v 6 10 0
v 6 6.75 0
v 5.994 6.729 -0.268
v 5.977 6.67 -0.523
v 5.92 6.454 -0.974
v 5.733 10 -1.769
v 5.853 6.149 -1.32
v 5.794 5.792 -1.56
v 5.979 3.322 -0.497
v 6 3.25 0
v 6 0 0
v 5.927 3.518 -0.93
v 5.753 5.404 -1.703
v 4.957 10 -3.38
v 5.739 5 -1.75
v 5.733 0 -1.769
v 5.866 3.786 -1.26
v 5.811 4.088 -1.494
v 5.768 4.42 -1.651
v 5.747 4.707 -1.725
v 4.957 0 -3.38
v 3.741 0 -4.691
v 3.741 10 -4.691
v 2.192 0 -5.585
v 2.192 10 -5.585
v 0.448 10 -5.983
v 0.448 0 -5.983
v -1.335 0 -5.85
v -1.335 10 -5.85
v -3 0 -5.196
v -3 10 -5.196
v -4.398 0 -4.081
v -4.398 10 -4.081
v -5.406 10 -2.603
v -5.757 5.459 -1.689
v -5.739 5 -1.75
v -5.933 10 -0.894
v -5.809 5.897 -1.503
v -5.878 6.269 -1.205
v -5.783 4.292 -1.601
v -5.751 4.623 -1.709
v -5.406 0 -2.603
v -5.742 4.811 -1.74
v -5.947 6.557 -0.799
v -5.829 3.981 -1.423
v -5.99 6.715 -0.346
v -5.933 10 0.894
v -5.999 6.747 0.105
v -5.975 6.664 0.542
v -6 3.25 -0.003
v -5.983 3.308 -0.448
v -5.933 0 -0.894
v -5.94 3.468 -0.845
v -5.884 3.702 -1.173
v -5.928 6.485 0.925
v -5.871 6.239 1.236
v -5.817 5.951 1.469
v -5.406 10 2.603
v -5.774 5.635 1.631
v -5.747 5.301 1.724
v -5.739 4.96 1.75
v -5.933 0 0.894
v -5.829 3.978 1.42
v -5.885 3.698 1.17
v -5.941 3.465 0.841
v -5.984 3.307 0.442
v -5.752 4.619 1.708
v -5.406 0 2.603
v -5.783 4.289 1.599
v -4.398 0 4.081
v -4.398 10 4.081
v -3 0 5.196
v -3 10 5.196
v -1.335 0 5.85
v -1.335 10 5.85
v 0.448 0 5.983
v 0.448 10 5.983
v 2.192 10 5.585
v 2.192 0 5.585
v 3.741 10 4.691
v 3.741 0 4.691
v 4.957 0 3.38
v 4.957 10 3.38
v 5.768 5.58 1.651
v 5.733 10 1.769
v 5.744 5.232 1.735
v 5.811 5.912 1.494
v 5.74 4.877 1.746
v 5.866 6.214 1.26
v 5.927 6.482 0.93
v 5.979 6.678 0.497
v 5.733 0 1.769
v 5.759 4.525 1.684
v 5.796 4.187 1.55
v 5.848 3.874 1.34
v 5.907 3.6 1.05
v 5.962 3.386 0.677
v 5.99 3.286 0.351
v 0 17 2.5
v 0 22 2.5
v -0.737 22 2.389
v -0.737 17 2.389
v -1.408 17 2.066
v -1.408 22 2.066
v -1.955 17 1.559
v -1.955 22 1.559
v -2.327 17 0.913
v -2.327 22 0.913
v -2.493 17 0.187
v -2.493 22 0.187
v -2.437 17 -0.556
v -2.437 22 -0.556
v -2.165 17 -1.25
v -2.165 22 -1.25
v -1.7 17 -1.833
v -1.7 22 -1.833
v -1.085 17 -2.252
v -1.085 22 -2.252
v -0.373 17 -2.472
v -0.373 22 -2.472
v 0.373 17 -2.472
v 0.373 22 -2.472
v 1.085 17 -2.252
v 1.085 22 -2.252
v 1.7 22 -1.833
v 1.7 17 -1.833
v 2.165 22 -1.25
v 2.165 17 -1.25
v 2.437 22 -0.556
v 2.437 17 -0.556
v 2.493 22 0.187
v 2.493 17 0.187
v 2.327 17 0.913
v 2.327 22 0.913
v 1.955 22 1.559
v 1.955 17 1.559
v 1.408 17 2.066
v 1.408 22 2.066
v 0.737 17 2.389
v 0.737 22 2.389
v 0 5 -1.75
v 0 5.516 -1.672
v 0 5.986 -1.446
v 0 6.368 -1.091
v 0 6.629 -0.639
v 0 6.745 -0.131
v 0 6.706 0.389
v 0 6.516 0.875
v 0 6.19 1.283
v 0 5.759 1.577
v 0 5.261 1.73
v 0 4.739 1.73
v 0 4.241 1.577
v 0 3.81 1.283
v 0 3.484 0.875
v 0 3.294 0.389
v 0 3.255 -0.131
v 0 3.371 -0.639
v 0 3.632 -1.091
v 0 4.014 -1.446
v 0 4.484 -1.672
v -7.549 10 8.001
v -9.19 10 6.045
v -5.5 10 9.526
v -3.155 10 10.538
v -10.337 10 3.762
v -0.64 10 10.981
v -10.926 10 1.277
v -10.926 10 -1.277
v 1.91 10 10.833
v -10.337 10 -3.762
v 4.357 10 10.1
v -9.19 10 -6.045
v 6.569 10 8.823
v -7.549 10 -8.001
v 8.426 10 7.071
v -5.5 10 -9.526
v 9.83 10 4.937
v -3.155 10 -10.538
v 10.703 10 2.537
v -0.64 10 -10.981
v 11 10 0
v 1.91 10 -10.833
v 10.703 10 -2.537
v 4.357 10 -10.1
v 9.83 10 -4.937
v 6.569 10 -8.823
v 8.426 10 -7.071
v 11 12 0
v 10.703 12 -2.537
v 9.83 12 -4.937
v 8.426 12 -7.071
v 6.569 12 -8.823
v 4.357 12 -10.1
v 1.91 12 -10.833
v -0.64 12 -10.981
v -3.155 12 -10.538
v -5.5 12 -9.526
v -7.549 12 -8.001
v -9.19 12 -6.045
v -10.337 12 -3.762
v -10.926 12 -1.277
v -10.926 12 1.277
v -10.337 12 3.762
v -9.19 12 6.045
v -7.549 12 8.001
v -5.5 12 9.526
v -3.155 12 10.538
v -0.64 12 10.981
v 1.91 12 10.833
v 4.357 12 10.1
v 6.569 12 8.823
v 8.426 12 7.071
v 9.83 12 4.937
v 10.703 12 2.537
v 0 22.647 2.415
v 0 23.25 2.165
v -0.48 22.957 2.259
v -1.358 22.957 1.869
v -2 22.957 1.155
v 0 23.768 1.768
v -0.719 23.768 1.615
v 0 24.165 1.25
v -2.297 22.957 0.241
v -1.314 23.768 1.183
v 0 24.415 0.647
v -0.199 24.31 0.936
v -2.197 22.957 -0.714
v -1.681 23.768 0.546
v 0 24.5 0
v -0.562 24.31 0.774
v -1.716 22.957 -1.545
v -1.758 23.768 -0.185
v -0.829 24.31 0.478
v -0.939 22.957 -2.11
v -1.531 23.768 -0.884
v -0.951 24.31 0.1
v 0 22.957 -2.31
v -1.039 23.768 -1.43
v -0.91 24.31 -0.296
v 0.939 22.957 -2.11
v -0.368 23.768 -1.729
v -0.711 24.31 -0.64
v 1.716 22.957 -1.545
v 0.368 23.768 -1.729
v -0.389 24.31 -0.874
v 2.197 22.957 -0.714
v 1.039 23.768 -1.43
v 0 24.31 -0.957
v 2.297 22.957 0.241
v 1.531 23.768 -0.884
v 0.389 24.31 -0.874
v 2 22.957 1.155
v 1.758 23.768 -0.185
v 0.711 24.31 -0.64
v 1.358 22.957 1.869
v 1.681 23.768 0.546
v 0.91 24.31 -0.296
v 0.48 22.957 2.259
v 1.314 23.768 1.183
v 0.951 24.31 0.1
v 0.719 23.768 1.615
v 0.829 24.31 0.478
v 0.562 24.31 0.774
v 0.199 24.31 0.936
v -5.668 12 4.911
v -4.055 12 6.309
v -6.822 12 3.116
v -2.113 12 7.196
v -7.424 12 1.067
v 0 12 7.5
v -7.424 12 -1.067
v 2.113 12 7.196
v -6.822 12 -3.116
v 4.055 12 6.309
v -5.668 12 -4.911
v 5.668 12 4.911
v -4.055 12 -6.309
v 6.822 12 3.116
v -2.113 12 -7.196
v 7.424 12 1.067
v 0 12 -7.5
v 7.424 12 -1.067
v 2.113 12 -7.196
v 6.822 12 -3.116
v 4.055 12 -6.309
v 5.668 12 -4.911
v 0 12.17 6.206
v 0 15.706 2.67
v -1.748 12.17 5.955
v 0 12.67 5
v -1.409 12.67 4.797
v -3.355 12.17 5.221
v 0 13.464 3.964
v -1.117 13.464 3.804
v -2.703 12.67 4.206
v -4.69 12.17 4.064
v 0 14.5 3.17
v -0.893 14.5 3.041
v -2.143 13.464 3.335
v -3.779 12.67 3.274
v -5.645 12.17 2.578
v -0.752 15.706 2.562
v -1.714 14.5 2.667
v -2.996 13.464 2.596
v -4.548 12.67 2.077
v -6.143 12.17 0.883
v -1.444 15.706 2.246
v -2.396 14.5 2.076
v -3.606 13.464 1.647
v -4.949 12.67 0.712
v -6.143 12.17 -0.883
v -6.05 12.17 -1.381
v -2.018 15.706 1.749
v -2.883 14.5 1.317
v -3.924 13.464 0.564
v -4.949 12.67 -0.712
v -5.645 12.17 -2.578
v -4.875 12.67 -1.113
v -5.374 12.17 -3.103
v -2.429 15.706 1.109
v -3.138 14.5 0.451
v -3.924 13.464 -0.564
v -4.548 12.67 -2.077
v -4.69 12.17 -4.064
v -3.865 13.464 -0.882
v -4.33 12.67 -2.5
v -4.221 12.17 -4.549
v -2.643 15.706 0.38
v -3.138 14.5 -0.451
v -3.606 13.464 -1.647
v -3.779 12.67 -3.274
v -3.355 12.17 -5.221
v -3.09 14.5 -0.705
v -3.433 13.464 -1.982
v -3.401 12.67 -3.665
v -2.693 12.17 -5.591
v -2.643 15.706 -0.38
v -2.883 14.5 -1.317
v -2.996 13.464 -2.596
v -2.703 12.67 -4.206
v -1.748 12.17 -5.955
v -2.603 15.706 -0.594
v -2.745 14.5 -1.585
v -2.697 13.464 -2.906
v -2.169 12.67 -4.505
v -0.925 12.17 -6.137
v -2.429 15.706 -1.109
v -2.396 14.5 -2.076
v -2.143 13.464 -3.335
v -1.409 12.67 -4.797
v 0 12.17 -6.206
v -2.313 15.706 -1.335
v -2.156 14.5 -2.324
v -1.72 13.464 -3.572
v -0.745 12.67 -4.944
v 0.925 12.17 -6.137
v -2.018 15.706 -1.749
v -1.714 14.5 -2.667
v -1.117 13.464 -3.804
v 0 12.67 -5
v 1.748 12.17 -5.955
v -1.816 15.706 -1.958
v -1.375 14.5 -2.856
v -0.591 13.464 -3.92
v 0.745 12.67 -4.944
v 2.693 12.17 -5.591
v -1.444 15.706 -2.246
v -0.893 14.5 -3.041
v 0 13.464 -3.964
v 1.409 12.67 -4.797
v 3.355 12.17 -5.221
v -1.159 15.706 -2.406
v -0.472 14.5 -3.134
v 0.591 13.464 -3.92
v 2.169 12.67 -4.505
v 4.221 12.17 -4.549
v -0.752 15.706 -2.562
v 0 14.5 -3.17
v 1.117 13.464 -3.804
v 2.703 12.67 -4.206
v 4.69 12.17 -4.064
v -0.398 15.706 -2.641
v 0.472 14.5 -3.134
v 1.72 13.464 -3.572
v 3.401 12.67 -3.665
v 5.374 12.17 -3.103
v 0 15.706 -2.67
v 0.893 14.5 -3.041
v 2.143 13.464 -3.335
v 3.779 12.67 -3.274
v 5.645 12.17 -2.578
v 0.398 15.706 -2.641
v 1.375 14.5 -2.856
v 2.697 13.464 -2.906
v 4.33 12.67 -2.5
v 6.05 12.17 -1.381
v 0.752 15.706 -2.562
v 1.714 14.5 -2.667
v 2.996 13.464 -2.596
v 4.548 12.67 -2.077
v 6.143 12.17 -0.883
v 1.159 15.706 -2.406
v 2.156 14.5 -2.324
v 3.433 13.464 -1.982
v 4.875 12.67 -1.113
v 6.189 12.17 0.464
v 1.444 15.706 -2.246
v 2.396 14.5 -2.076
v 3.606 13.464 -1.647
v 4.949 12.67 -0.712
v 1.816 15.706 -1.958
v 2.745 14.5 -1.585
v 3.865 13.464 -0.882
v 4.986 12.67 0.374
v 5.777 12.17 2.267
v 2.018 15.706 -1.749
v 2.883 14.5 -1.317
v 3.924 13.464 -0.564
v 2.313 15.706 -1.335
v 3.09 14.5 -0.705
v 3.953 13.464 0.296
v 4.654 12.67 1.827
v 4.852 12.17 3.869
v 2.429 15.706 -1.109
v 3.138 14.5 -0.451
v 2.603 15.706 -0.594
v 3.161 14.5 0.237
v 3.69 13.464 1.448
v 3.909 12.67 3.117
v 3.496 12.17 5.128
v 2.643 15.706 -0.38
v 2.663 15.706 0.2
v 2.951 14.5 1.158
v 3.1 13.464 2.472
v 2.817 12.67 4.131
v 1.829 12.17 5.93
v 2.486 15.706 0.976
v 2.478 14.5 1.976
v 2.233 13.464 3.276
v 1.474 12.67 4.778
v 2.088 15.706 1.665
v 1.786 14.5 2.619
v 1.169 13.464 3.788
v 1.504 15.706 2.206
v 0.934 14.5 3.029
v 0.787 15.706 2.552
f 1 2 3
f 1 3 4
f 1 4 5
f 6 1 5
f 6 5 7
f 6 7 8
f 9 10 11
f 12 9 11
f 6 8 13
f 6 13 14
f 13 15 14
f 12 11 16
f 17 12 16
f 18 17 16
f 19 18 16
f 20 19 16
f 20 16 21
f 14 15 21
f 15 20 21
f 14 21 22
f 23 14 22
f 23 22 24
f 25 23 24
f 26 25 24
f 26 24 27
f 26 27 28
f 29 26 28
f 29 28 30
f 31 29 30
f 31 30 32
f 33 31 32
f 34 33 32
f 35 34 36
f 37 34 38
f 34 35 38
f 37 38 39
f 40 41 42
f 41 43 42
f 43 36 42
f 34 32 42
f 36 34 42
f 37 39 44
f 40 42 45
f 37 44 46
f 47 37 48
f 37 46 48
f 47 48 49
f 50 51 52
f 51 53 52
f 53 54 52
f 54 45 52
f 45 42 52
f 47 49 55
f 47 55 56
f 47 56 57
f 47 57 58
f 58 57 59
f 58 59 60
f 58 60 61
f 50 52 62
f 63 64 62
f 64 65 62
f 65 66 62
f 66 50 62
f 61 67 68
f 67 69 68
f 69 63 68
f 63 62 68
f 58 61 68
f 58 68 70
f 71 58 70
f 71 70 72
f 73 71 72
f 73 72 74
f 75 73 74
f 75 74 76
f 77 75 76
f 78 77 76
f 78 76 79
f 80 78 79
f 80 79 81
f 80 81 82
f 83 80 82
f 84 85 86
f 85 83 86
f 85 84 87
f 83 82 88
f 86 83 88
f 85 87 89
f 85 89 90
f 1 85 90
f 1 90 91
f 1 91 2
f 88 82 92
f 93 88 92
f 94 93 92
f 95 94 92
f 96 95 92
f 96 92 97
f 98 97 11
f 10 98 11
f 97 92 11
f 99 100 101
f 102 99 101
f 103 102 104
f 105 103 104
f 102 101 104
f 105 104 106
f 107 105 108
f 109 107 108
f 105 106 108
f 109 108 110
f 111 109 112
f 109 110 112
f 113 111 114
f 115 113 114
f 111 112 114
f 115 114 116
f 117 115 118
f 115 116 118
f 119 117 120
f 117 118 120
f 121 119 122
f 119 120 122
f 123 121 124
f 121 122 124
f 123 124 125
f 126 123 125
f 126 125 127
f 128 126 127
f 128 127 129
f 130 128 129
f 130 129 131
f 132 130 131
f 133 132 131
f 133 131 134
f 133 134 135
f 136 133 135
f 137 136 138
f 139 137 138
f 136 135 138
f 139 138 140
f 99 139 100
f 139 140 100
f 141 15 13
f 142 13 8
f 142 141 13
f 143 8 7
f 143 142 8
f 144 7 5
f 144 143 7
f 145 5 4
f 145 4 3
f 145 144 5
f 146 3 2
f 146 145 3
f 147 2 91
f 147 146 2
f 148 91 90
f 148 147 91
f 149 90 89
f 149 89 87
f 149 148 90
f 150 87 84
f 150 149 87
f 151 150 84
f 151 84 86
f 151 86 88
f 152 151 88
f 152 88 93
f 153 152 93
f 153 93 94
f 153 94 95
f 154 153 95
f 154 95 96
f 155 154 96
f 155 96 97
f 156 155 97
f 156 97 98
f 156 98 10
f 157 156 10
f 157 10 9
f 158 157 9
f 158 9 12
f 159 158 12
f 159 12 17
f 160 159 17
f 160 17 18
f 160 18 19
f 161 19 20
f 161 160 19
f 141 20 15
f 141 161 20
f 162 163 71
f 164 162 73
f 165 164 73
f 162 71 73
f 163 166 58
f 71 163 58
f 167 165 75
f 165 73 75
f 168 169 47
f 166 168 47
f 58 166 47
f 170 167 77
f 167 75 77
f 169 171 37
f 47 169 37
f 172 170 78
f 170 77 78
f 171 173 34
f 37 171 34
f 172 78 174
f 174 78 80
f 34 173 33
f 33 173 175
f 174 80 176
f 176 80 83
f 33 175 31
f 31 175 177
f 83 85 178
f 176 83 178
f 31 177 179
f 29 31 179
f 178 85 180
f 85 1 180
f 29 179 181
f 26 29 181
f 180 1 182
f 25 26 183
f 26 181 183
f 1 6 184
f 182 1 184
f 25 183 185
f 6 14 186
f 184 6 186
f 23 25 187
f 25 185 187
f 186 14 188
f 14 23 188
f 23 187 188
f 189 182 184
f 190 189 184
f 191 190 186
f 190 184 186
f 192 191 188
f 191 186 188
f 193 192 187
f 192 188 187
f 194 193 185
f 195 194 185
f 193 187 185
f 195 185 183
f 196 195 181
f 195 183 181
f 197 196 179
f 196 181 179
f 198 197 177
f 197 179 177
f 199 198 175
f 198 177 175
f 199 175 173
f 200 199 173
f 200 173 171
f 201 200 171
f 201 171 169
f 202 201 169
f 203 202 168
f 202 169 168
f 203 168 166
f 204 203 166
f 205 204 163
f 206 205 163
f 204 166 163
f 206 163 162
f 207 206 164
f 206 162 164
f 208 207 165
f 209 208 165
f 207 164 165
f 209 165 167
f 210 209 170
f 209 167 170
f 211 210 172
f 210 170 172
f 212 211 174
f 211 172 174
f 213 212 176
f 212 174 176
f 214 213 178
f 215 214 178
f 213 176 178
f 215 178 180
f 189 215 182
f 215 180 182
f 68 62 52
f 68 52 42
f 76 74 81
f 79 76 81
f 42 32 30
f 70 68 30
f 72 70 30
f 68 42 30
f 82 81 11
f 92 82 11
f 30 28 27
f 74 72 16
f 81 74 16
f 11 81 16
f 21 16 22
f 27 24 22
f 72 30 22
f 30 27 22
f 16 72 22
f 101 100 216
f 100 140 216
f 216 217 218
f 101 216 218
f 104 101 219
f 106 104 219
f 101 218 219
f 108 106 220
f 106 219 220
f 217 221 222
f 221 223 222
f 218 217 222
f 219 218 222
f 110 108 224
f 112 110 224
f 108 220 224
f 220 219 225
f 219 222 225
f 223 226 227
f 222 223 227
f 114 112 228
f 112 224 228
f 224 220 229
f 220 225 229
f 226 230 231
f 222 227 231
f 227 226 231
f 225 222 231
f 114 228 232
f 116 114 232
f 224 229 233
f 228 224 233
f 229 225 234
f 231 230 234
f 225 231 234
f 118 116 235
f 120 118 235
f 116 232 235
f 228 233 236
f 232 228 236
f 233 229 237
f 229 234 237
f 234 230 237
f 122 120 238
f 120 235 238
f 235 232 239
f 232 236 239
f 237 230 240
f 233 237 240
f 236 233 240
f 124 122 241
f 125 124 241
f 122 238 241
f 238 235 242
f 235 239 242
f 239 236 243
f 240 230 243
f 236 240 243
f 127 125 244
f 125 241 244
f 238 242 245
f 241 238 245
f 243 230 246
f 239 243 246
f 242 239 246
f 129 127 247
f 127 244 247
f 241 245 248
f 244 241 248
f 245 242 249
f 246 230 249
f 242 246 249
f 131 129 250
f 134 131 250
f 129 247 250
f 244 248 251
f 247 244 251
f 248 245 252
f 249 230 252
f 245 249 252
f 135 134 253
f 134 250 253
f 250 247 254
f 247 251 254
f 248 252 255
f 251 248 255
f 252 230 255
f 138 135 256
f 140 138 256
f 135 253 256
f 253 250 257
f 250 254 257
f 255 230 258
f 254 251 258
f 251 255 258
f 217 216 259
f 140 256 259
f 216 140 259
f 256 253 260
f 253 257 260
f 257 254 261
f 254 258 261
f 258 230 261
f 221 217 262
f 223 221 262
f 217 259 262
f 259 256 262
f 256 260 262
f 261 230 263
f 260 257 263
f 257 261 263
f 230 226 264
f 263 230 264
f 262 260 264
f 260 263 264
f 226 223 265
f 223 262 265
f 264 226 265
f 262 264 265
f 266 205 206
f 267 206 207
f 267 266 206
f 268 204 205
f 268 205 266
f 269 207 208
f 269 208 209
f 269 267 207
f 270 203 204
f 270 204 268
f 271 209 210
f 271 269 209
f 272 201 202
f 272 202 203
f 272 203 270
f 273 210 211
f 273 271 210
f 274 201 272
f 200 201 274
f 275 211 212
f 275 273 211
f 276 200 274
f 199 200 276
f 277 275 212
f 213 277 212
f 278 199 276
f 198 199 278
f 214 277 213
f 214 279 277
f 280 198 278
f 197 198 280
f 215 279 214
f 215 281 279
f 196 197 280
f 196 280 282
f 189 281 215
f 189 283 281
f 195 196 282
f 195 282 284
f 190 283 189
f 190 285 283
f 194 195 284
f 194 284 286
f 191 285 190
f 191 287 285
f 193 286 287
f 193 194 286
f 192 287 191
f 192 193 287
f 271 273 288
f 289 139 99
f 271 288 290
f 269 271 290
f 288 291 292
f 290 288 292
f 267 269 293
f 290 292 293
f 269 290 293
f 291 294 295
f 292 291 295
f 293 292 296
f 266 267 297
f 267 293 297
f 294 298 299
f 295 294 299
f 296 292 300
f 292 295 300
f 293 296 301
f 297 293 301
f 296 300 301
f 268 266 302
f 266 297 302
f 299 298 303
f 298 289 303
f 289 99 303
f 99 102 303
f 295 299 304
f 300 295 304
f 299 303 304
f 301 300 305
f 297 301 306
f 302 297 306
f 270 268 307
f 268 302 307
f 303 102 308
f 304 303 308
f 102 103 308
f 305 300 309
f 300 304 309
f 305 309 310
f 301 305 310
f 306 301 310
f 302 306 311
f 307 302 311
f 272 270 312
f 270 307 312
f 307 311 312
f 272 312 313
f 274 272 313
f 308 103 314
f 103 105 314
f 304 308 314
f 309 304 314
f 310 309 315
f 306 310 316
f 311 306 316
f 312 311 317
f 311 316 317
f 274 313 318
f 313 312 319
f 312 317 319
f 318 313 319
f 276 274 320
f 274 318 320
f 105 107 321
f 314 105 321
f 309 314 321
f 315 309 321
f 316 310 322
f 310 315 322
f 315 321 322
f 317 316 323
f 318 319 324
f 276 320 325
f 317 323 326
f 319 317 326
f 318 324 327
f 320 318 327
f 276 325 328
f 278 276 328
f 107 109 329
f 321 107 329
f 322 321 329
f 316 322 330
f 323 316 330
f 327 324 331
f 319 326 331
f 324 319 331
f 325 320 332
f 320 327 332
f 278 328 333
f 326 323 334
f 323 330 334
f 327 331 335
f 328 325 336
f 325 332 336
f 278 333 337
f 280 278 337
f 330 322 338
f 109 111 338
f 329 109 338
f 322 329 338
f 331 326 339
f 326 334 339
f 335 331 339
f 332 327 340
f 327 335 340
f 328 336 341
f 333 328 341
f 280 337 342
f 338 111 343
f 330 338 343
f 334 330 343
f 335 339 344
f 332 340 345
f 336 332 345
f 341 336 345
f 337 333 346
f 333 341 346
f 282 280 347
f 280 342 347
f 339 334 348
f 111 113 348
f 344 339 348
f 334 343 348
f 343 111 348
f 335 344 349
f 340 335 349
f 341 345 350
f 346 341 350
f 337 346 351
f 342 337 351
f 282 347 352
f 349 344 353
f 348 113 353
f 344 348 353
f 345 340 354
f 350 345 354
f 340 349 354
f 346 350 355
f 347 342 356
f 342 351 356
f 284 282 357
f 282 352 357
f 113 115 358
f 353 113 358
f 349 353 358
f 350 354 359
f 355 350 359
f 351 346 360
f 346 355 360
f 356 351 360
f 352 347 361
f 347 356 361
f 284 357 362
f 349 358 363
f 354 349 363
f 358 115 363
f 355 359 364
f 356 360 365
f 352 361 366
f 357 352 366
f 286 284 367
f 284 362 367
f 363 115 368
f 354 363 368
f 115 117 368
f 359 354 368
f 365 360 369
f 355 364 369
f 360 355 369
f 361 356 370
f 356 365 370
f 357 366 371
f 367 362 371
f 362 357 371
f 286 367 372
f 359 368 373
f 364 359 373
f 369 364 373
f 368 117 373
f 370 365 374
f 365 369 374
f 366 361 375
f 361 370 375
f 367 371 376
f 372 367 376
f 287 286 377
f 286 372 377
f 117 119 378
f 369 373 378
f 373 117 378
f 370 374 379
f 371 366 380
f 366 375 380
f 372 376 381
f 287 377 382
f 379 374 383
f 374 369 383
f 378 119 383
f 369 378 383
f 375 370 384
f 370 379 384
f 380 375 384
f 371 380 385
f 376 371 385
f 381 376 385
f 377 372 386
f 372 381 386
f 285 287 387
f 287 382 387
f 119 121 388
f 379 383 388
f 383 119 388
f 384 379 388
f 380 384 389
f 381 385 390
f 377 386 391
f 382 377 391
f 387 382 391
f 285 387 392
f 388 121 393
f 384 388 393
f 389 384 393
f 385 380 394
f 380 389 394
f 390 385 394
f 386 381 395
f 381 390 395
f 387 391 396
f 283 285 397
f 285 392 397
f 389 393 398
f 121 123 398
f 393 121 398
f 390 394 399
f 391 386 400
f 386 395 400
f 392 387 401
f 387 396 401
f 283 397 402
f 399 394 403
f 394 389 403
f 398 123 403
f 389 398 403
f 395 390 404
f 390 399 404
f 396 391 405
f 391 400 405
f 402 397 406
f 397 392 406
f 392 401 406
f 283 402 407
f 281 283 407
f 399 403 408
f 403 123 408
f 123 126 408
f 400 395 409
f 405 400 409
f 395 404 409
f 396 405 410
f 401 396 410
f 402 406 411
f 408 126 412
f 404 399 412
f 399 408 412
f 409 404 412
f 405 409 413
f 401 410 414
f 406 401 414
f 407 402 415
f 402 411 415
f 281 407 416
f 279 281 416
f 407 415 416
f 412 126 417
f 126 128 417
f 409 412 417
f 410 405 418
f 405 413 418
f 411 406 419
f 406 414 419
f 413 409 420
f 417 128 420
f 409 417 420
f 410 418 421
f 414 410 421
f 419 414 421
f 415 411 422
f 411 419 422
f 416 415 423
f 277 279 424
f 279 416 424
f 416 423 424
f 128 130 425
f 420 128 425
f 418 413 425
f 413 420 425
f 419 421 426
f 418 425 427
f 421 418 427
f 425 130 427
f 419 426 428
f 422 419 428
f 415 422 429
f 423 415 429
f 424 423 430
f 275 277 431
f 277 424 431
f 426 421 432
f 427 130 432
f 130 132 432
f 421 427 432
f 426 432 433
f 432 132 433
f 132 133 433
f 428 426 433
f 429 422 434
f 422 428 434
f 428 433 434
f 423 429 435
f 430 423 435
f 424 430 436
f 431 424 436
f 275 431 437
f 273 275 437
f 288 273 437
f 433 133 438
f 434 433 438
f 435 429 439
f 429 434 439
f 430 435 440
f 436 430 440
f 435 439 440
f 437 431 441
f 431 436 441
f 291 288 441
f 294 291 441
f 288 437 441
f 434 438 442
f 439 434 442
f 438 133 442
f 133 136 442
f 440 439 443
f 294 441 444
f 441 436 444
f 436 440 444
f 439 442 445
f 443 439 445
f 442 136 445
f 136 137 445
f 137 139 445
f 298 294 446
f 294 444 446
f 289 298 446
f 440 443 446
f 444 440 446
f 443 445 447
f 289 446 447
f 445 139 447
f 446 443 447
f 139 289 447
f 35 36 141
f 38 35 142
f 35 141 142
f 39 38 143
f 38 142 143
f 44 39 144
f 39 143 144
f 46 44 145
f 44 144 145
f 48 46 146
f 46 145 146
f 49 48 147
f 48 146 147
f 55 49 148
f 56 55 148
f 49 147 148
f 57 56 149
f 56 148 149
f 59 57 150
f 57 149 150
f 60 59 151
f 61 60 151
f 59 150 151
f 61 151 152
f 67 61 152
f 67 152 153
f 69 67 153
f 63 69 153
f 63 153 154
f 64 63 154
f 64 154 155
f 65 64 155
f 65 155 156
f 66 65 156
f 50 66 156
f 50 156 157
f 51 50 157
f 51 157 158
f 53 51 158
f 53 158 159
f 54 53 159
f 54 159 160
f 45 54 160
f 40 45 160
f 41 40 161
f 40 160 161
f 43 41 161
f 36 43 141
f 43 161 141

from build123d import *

# Parameters (mm, degrees)
SKETCH1_R               = 6
BOSS_EXTRUDE1_DEPTH     = 10
SKETCH2_R               = 11
BOSS_EXTRUDE2_DEPTH     = 2
FILLET1_R               = 5
SKETCH5_R               = 1.75
CUT_EXTRUDE1_DEPTH      = 12
CUT_EXTRUDE1_DEPTH_BACK = 12


with BuildPart() as part:
    # Sketch1 → Boss-Extrude1 (new body)
    with BuildSketch(Plane(origin=(0, 0, 0), x_dir=(1, 0, 0), z_dir=(0, 1, 0))):
        Circle(SKETCH1_R)
    extrude(amount=BOSS_EXTRUDE1_DEPTH)

    # Sketch2 → Boss-Extrude2 (add)
    with BuildSketch(Plane(origin=(0, 10, 0), x_dir=(1, 0, 0), z_dir=(0, 1, 0))):
        Circle(SKETCH2_R)
    extrude(amount=BOSS_EXTRUDE2_DEPTH)

    # Sketch3 → Revolve1 (revolve)
    with BuildSketch(Plane(origin=(0, 0, 0), x_dir=(0, 0, -1), z_dir=(1, 0, 0))):
        with BuildLine():
            Line((0, 12), (-2.5, 12))
            Line((-2.5, 12), (-2.5, 22))
            ThreePointArc((-2.5, 22), (-1.767766953, 23.767766953), (0, 24.5))
            Line((0, 24.5), (0, 12))
        make_face()
    revolve(axis=Axis((0, 24.5, 0), (0, -1, 0)))

    # Fillet1
    fillet1_edges = [part.edges().sort_by_distance(p)[0] for p in [
        (0, 12, -2.5),
    ]]
    fillet(fillet1_edges, radius=FILLET1_R)

    # Sketch5 → Cut-Extrude1 (cut, two sides)
    with BuildSketch(Plane(origin=(0, 0, 0), x_dir=(0, 0, -1), z_dir=(1, 0, 0))) as cut_extrude1_sk:
        with Locations((0, 5)):
            Circle(SKETCH5_R)
    extrude(amount=CUT_EXTRUDE1_DEPTH, mode=Mode.SUBTRACT)
    extrude(cut_extrude1_sk.sketch, amount=-CUT_EXTRUDE1_DEPTH_BACK, mode=Mode.SUBTRACT)


solid = part.part
